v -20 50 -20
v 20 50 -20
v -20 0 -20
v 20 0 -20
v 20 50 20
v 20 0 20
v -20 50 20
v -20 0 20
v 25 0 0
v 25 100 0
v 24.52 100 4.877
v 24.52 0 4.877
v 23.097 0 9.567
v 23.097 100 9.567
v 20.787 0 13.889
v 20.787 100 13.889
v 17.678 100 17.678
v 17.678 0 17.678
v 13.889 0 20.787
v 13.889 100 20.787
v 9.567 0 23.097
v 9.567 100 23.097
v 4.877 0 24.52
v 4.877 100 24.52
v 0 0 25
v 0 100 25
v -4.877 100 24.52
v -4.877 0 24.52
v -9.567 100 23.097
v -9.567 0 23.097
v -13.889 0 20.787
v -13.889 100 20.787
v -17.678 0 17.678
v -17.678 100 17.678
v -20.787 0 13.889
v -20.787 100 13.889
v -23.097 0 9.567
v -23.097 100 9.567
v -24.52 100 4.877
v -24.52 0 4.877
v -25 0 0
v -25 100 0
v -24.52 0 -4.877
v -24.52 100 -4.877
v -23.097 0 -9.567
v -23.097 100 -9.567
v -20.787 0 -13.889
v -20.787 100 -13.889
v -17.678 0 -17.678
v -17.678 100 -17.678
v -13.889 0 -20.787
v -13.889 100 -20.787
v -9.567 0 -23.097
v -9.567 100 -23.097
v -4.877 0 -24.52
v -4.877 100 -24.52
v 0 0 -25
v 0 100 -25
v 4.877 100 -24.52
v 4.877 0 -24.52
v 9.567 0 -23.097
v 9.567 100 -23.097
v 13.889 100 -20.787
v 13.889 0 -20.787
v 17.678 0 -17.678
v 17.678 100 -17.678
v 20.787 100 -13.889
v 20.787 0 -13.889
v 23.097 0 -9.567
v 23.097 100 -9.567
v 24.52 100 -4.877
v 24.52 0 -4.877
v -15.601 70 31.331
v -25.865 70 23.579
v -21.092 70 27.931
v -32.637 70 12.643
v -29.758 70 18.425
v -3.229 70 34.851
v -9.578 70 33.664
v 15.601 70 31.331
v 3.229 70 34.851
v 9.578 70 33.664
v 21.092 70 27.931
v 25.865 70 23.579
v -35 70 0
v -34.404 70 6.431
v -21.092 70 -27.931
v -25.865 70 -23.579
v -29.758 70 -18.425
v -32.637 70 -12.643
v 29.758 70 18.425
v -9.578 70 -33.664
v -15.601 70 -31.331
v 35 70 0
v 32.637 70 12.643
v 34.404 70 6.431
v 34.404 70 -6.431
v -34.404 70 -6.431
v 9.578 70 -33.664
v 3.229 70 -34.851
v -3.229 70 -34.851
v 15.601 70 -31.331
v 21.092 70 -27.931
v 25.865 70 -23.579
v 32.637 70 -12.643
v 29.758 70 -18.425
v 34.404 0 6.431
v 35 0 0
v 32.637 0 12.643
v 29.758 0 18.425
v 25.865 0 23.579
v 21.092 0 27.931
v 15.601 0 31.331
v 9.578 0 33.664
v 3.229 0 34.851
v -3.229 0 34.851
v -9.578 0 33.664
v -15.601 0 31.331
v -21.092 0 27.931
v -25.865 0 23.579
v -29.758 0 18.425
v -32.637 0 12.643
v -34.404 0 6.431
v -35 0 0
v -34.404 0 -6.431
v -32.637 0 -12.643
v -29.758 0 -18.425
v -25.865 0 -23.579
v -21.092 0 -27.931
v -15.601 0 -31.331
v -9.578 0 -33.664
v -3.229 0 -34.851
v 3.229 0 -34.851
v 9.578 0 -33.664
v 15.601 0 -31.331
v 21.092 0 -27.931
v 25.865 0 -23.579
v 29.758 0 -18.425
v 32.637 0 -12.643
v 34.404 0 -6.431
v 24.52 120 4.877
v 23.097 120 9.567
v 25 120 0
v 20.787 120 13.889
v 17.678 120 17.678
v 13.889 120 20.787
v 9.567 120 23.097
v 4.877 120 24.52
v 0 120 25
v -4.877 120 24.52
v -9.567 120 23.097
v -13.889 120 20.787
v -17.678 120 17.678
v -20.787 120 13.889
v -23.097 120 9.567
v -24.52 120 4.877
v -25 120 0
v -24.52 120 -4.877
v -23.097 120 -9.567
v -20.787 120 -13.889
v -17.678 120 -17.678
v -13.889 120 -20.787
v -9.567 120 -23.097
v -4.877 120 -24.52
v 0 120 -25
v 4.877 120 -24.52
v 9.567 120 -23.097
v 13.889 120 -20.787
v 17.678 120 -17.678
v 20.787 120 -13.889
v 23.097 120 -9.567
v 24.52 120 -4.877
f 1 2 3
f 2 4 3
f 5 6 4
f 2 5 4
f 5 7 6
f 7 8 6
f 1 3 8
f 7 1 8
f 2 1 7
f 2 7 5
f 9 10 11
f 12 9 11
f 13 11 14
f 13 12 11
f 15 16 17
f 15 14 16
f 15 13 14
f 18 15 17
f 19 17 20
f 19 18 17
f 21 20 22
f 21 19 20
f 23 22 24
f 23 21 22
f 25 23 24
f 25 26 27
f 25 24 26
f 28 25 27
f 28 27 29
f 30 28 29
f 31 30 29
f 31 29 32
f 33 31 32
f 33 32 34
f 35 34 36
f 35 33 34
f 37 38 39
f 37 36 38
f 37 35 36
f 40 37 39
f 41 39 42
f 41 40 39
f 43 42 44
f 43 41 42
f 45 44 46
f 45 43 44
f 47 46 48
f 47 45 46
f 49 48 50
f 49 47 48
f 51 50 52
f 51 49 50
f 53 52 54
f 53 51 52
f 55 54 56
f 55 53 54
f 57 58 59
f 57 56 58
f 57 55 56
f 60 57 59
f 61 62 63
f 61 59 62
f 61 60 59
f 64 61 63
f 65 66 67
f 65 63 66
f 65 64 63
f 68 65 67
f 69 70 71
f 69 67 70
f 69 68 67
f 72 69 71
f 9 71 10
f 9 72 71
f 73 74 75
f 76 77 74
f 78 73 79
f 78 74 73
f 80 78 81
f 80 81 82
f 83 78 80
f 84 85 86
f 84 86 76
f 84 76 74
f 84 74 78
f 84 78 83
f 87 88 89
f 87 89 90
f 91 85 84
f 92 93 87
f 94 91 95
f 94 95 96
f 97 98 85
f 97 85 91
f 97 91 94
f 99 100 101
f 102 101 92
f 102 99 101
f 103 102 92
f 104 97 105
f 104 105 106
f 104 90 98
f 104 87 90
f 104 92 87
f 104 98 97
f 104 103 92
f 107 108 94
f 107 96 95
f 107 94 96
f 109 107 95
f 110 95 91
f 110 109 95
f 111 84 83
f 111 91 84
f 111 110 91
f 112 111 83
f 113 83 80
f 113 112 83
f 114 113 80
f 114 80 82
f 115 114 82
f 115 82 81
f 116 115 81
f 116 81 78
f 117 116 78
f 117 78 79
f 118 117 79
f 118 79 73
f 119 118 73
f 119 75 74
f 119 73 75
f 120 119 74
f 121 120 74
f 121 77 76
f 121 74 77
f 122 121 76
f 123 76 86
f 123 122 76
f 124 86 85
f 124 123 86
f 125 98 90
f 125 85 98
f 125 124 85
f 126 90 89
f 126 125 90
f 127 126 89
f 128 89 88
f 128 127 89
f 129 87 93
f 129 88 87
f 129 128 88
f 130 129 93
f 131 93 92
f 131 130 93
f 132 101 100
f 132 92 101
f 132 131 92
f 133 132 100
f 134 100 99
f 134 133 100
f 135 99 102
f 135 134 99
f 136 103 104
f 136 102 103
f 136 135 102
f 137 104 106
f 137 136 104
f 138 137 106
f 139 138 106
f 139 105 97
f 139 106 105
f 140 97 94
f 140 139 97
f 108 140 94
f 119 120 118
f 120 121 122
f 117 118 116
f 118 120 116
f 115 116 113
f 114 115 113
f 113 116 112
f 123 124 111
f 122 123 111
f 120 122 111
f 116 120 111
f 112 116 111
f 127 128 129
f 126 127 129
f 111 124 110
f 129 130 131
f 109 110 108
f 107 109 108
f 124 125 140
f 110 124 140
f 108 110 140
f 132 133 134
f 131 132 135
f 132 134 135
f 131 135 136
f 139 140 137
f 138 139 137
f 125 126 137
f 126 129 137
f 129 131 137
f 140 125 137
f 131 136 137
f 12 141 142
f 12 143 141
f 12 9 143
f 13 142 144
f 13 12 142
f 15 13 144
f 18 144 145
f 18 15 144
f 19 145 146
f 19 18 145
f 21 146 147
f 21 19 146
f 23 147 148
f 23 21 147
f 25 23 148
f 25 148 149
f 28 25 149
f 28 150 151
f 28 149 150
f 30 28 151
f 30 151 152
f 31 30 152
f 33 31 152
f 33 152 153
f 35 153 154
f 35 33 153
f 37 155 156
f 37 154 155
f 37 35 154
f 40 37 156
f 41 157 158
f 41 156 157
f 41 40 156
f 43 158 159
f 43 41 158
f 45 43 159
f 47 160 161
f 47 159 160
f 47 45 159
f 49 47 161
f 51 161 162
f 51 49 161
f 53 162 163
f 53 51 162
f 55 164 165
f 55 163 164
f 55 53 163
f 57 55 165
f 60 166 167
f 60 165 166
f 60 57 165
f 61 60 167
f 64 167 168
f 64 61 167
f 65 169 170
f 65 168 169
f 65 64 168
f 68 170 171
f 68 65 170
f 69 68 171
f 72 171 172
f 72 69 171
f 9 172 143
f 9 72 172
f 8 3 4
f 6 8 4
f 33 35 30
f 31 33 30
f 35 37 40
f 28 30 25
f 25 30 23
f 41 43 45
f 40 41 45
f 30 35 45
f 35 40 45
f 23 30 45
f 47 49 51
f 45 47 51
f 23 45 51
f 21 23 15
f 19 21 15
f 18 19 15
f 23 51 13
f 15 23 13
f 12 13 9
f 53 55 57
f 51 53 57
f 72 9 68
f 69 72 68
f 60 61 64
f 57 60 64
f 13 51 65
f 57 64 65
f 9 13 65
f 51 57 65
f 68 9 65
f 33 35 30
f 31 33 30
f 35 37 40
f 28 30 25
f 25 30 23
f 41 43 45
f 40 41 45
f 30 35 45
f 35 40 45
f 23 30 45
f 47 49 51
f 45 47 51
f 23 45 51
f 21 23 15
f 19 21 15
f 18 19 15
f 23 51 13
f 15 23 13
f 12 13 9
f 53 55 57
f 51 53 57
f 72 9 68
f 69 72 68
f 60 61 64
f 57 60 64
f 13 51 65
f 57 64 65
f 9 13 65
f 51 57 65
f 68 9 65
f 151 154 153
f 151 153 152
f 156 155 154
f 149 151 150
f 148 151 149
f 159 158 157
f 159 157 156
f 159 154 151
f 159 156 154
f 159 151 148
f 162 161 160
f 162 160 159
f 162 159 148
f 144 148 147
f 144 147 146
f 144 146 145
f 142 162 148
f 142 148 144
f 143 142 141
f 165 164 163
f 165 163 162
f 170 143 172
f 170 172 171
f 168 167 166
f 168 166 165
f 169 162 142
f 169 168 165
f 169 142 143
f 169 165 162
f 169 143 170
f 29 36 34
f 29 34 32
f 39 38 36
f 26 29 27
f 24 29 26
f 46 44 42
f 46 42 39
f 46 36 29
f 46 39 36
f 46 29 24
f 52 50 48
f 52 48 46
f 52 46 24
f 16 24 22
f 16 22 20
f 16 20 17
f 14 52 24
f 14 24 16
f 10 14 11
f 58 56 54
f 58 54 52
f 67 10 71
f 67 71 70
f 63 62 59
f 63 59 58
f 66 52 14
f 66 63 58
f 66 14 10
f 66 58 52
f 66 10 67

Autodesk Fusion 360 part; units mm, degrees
sketch "Sketch1" plane through (0, 0, 0) normal (0, 1, 0) x (1, 0, 0)
  circle A0 centre (0, 0) radius 25
  circle A1 centre (0, 0) radius 35
  dimension "d1" = 50
  dimension "d2" = 70
extrude "Extrude1" add sketch "Sketch1" along normal blind 120 contours A0 makes body 1
extrude "Extrude2" add sketch "Sketch1" along normal blind 70 separate body contours A0 | A1 makes body 2
extrude "Extrude3" add sketch "Sketch1" along normal blind 100 separate body contours A0 makes body 3
sketch "Sketch2" plane through (0, 0, 0) normal (0, 1, 0) x (1, 0, 0)
  line L0 (20, 20) -> (-20, 20)
  line L1 (-20, 20) -> (-20, -20)
  line L2 (-20, -20) -> (20, -20)
  line L3 (20, -20) -> (20, 20)
  line L4 (20, 20) -> (-20, -20) construction
  line L5 (-20, 20) -> (20, -20) construction
  dimension "d9" = 40
  dimension "d10" = 40
extrude "Extrude6" add sketch "Sketch2" along normal blind 50 separate body makes body 4
copy_body "Body->Comp2" bodies 1 removing the originals makes body 5 in component "Component"
copy_body "Body->Comp3" bodies 3 removing the originals makes body 6 in component "Component'"
copy_body "Body->Comp4" bodies 2 removing the originals makes body 7 in component "Component''"
copy_body "Body->Comp5" bodies 4 removing the originals makes body 8 in component "Component'''"
component "Component" placed x (1, 0, 0) y (0, 1, 0) z (0, 0, 1) at (0, 0, 0)
component "Component'" placed x (1, 0, 0) y (0, 1, 0) z (0, 0, 1) at (0, 0, 0)
component "Component''" placed x (1, 0, 0) y (0, 1, 0) z (0, 0, 1) at (0, 0, 0)
component "Component'''" placed x (1, 0, 0) y (0, 1, 0) z (0, 0, 1) at (0, 0, 0)
